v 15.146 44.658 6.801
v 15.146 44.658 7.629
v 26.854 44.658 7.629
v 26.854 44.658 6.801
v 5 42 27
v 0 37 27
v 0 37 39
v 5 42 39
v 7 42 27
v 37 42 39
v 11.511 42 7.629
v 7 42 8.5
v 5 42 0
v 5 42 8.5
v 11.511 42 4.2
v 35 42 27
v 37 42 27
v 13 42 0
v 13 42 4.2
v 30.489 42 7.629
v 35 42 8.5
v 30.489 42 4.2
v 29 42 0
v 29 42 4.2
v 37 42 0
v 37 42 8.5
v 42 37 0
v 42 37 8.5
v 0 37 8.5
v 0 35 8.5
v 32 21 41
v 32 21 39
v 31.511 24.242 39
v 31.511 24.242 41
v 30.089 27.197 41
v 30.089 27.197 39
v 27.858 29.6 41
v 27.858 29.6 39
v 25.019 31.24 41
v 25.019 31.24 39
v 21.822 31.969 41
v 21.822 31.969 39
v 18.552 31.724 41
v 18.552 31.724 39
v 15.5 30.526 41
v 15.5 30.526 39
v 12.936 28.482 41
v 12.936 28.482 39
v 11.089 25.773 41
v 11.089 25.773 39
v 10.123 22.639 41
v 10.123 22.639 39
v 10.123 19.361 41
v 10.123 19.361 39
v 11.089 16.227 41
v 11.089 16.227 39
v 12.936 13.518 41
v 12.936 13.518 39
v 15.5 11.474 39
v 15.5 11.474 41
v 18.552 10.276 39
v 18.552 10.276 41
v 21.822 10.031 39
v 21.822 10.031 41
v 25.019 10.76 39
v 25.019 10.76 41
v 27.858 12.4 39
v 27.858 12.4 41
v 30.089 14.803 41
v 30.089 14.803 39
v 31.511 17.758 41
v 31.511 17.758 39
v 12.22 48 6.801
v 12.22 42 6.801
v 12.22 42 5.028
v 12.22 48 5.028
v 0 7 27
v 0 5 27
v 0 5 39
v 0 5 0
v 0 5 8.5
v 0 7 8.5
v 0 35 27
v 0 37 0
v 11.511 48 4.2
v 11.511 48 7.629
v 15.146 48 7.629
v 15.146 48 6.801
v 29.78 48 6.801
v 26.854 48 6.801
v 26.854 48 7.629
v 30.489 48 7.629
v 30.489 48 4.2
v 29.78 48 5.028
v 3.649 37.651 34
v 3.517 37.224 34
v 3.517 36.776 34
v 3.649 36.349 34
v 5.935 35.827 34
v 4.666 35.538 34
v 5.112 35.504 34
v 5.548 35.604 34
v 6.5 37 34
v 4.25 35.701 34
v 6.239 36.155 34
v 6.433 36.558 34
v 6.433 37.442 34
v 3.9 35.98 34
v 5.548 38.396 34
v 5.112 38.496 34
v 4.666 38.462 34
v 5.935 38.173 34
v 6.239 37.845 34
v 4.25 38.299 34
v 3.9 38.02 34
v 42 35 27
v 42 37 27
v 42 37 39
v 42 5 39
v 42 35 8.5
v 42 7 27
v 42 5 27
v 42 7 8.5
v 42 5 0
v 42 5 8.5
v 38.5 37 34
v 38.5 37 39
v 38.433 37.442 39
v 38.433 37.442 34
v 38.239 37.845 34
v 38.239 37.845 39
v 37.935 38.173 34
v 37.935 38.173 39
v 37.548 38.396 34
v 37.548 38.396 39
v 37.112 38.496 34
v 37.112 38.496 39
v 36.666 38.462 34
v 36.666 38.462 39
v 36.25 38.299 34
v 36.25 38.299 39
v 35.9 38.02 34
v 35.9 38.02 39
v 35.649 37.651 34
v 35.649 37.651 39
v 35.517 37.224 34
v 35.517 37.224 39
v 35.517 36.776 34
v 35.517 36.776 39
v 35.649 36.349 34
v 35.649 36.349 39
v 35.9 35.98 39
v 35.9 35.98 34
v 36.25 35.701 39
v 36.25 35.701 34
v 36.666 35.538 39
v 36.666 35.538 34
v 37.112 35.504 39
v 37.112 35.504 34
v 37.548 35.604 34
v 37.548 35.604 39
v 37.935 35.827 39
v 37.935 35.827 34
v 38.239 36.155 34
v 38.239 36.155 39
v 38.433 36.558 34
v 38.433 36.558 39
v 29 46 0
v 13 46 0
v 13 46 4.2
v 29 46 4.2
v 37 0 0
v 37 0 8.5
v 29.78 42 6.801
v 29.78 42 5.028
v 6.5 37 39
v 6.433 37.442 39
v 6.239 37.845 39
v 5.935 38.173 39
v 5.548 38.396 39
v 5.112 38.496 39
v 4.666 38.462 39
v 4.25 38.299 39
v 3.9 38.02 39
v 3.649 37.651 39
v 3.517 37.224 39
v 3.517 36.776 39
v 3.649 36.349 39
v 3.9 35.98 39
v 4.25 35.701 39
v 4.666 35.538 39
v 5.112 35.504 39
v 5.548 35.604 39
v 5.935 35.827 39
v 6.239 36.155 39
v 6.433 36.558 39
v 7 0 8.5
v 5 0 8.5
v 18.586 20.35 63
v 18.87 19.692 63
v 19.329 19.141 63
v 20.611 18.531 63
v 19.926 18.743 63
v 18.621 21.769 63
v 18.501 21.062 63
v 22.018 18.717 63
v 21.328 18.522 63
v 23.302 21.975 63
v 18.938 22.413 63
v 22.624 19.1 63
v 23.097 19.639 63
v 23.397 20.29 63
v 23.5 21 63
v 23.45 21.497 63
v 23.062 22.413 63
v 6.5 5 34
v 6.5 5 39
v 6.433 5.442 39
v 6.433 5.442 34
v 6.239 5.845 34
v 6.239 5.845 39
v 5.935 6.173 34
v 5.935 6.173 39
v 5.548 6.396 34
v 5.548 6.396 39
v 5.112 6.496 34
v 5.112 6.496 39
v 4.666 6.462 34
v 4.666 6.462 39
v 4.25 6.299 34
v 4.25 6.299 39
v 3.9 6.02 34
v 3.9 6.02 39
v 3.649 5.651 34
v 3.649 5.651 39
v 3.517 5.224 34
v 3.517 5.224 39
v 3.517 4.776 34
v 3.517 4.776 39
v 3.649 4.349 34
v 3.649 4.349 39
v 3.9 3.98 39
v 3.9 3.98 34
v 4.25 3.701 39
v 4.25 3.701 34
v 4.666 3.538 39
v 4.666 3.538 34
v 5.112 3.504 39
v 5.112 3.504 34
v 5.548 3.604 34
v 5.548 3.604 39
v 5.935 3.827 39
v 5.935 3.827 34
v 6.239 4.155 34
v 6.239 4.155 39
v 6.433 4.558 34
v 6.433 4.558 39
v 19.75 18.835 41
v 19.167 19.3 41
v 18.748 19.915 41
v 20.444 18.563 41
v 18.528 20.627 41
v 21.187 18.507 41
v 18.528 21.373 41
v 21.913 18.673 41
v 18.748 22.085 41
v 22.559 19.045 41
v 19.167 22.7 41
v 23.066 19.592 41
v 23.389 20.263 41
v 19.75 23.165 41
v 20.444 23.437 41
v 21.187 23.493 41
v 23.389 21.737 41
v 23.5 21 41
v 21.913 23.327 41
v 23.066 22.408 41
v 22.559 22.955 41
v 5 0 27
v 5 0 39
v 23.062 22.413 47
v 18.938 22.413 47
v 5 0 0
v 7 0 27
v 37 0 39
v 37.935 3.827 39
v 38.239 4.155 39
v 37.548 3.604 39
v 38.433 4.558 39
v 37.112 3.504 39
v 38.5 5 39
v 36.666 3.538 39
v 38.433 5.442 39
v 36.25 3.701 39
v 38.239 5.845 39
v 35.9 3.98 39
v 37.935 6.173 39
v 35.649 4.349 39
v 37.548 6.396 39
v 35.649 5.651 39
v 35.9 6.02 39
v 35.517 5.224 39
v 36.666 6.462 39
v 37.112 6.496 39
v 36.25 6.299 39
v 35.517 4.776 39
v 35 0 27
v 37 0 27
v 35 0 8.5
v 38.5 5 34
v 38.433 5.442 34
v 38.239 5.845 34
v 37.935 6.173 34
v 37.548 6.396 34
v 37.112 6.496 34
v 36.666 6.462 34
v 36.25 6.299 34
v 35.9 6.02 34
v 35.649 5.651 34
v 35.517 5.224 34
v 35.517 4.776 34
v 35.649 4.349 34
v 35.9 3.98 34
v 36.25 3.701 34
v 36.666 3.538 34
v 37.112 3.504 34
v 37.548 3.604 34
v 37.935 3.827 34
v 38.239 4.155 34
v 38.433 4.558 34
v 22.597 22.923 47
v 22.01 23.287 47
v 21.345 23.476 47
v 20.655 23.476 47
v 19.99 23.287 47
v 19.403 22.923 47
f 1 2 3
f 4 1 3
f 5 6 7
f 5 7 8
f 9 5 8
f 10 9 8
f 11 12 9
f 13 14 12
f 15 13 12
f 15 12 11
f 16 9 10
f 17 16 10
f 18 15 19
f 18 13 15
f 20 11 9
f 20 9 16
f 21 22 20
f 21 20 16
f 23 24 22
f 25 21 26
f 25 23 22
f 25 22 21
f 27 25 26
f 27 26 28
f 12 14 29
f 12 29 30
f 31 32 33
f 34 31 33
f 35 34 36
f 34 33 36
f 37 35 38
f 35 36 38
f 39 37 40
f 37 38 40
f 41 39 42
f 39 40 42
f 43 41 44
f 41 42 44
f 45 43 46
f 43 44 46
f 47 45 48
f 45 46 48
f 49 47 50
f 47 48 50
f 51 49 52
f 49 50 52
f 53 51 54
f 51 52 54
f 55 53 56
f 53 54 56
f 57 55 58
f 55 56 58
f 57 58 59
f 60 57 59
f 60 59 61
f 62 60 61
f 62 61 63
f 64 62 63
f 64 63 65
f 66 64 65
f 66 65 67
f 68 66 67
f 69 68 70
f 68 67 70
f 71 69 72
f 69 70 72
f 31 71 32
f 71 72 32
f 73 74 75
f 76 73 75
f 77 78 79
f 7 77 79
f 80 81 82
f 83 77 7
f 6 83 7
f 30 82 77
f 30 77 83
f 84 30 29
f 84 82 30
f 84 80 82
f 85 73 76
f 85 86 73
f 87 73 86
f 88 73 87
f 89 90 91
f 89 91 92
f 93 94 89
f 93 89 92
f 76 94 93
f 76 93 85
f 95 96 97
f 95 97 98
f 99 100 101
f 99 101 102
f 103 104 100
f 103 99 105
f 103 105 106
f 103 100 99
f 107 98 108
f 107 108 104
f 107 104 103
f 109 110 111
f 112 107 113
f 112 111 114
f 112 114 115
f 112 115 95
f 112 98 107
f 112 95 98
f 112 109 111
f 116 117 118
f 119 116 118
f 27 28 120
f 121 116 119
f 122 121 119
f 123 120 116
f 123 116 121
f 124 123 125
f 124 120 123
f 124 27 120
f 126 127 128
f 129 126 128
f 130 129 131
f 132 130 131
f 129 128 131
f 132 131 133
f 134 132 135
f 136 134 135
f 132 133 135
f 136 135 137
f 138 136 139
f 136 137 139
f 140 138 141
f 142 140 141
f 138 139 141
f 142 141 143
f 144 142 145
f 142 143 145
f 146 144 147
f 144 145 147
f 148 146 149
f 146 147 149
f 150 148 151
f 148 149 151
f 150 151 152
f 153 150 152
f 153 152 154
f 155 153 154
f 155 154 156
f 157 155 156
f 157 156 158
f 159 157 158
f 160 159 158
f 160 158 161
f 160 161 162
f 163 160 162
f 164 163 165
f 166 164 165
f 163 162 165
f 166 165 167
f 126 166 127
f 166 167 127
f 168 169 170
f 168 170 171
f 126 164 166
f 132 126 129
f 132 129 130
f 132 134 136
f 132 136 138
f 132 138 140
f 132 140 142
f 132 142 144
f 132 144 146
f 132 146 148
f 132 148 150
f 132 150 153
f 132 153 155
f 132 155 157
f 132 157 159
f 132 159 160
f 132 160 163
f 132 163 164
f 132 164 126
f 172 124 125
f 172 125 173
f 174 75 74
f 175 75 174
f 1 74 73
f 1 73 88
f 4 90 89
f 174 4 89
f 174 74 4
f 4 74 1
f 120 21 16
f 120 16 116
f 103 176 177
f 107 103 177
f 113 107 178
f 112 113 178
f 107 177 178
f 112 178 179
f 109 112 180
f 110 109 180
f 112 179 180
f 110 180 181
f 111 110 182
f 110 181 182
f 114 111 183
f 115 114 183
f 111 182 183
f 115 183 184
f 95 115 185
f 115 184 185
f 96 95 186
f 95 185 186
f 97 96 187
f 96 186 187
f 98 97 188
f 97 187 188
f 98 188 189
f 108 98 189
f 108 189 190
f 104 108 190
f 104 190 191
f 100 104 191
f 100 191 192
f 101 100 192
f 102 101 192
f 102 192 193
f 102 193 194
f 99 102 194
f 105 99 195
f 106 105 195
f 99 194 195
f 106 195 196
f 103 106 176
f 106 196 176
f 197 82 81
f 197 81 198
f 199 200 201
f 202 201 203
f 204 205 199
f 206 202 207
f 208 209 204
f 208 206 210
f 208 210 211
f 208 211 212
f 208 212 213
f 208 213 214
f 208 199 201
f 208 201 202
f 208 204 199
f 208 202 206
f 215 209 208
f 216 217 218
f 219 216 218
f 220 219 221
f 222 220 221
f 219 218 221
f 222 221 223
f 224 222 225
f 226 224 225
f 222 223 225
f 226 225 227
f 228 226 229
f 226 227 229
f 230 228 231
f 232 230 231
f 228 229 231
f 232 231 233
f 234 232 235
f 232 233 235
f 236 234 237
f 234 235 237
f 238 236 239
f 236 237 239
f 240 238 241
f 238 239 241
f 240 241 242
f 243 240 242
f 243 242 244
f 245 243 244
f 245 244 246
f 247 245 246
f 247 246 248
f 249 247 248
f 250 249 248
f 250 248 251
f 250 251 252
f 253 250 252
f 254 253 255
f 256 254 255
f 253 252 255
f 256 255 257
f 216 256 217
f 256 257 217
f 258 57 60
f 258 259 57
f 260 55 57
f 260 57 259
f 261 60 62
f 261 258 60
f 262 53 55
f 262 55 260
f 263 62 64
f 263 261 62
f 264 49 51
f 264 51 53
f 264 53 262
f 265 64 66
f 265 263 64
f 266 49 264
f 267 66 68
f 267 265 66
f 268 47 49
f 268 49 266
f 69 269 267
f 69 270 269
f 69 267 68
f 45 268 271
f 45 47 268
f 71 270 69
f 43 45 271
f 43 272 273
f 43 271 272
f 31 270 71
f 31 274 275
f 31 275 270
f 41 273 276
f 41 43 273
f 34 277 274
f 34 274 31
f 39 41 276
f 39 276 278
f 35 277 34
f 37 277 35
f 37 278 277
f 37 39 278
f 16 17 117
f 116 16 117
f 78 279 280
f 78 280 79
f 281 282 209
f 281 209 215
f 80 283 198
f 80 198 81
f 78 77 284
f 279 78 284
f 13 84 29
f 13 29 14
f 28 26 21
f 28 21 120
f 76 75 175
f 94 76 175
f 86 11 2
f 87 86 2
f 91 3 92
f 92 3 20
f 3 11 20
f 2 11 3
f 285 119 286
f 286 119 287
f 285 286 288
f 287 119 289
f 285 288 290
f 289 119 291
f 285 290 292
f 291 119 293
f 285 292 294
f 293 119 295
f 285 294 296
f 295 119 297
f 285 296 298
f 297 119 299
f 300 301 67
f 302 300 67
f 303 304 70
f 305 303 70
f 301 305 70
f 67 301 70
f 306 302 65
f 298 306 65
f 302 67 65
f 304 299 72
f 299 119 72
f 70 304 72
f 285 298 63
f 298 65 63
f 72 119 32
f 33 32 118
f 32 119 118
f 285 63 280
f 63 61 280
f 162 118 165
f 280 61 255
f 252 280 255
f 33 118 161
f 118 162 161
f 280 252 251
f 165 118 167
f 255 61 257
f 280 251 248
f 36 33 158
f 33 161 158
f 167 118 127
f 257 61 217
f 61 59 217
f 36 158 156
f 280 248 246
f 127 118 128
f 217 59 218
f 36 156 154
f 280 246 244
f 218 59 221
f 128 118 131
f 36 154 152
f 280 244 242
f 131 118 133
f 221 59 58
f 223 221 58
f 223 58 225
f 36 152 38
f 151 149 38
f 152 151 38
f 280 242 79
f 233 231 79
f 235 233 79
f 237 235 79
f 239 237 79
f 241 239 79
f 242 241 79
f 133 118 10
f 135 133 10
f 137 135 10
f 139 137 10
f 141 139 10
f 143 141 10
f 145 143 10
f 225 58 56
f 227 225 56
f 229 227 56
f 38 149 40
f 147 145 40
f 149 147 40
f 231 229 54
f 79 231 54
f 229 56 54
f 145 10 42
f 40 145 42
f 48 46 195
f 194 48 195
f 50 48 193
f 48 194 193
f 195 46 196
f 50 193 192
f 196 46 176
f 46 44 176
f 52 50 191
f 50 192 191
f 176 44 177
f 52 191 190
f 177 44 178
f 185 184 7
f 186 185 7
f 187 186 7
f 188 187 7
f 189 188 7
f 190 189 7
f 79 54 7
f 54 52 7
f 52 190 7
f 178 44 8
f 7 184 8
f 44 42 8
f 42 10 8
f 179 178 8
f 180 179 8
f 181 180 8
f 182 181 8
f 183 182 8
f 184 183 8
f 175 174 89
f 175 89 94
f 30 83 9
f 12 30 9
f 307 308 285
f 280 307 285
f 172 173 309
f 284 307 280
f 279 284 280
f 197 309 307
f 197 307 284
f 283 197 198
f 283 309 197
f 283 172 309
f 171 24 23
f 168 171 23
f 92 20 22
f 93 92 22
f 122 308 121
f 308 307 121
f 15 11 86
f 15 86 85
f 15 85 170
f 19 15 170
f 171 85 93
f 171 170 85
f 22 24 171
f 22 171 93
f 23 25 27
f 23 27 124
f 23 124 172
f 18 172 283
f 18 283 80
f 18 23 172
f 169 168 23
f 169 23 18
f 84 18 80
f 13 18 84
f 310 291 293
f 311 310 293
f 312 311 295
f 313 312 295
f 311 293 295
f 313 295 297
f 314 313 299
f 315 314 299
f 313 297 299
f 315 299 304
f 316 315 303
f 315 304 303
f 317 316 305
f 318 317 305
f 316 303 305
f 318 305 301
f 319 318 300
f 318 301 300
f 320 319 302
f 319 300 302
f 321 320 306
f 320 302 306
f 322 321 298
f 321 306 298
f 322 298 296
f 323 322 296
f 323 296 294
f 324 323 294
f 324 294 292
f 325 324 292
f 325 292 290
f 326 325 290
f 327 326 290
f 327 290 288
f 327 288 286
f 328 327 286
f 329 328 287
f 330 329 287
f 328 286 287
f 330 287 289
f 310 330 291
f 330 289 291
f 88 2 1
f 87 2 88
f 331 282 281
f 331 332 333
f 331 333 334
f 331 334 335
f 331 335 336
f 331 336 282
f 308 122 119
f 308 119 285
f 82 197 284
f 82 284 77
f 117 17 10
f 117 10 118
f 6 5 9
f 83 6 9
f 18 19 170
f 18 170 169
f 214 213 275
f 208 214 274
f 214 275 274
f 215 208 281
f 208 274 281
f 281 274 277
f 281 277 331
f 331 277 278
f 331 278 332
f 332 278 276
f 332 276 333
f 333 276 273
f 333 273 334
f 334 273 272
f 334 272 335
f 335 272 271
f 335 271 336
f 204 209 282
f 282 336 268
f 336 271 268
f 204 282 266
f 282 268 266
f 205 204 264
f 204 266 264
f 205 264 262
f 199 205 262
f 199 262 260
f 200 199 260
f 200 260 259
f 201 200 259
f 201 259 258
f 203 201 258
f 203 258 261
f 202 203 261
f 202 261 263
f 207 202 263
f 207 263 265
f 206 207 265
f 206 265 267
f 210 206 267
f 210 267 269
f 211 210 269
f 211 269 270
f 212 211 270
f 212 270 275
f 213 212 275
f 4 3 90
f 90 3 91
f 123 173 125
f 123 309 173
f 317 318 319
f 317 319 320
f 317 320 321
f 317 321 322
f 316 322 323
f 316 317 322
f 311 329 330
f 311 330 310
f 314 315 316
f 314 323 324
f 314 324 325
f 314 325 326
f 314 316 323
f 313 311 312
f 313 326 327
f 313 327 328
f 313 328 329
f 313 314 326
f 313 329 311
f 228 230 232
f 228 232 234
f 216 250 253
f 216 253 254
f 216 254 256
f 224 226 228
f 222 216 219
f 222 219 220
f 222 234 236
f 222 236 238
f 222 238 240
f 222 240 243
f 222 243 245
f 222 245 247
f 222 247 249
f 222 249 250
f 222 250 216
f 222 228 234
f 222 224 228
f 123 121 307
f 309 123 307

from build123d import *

# Parameters (mm, degrees)
EXTRUDE_1_DEPTH     = 39
CUT_EXTRUDE_1_DEPTH = 18.5
SKETCH_3_R          = 11
EXTRUDE_2_DEPTH     = 2
SKETCH_4_R          = 2.5
EXTRUDE_3_DEPTH     = 22
CUT_EXTRUDE_2_DEPTH = 16
SKETCH_6_R          = 1.5
CUT_EXTRUDE_3_DEPTH = 5
SKETCH_7_W          = 16
SKETCH_7_H          = 4.2
EXTRUDE_4_DEPTH     = 4
SKETCH_8_W          = 18.978516406
SKETCH_8_H          = 3.428953429
SKETCH_8_W_2        = 17.559561908
SKETCH_8_H_2        = 1.773693122
EXTRUDE_5_DEPTH     = 6
SKETCH_9_W          = 11.707219222
SKETCH_9_H          = 3.341648532
CUT_EXTRUDE_4_DEPTH = 2


with BuildPart() as part:
    # 草图1 → 凸台-拉伸1 (new body)
    with BuildSketch(Plane.XY):
        Polygon((0, 37), (5, 42), (37, 42), (42, 37), (42, 5), (37, 0), (5, 0), (0, 5), align=None)
    extrude(amount=EXTRUDE_1_DEPTH)

    # 草图2 → 切除-拉伸1 (cut)
    with BuildSketch(Plane.XY.offset(27)):
        Polygon((37, 42), (35, 42), (42, 35), (42, 37), align=None)
        Polygon((5, 42), (0, 37), (0, 35), (7, 42), align=None)
        Polygon((5, 0), (7, 0), (0, 7), (0, 5), align=None)
        Polygon((37, 0), (42, 5), (42, 7), (35, 0), align=None)
    extrude(amount=-CUT_EXTRUDE_1_DEPTH, mode=Mode.SUBTRACT)

    # 草图3 → 凸台-拉伸2 (add)
    with BuildSketch(Plane.XY.offset(39)):
        with Locations((21, 21)):
            Circle(SKETCH_3_R)
    extrude(amount=EXTRUDE_2_DEPTH)

    # 草图4 → 凸台-拉伸3 (add)
    with BuildSketch(Plane.XY.offset(41)):
        with Locations((21, 21)):
            Circle(SKETCH_4_R)
    extrude(amount=EXTRUDE_3_DEPTH)

    # 草图5 → 切除-拉伸2 (cut)
    with BuildSketch(Plane.XY.offset(63)):
        with BuildLine():
            Line((18.937577059, 22.412944307), (23.062422941, 22.412944307))
            ThreePointArc((23.062422941, 22.412944307), (21, 23.5), (18.937577059, 22.412944307))
        make_face()
    extrude(amount=-CUT_EXTRUDE_2_DEPTH, mode=Mode.SUBTRACT)

    # 草图6 → 切除-拉伸3 (cut)
    with BuildSketch(Plane.XY.offset(39)):
        with Locations((37, 5)):
            Circle(SKETCH_6_R)
        with Locations((5, 5)):
            Circle(SKETCH_6_R)
        with Locations((37, 37)):
            Circle(SKETCH_6_R)
        with Locations((5, 37)):
            Circle(SKETCH_6_R)
    extrude(amount=-CUT_EXTRUDE_3_DEPTH, mode=Mode.SUBTRACT)

    # 草图7 → 凸台-拉伸4 (add)
    with BuildSketch(Plane(origin=(0, 42, 0), x_dir=(1, 0, 0), z_dir=(0, 1, 0))):
        with Locations((21, -2.1)):
            Rectangle(SKETCH_7_W, SKETCH_7_H)
    extrude(amount=EXTRUDE_4_DEPTH)

    # 草图8 → 凸台-拉伸5 (add)
    with BuildSketch(Plane(origin=(0, 42, 0), x_dir=(1, 0, 0), z_dir=(0, 1, 0))):
        with Locations((21, -5.914476715)):
            Rectangle(SKETCH_8_W, SKETCH_8_H)
        with Locations((21, -5.914476714)):
            Rectangle(SKETCH_8_W_2, SKETCH_8_H_2, mode=Mode.SUBTRACT)
    extrude(amount=EXTRUDE_5_DEPTH)

    # 草图9 → 切除-拉伸4 (cut)
    with BuildSketch(Plane.XY.offset(7.628953429)):
        with Locations((21, 46.329175734)):
            Rectangle(SKETCH_9_W, SKETCH_9_H)
    extrude(amount=-CUT_EXTRUDE_4_DEPTH, mode=Mode.SUBTRACT)


solid = part.part
